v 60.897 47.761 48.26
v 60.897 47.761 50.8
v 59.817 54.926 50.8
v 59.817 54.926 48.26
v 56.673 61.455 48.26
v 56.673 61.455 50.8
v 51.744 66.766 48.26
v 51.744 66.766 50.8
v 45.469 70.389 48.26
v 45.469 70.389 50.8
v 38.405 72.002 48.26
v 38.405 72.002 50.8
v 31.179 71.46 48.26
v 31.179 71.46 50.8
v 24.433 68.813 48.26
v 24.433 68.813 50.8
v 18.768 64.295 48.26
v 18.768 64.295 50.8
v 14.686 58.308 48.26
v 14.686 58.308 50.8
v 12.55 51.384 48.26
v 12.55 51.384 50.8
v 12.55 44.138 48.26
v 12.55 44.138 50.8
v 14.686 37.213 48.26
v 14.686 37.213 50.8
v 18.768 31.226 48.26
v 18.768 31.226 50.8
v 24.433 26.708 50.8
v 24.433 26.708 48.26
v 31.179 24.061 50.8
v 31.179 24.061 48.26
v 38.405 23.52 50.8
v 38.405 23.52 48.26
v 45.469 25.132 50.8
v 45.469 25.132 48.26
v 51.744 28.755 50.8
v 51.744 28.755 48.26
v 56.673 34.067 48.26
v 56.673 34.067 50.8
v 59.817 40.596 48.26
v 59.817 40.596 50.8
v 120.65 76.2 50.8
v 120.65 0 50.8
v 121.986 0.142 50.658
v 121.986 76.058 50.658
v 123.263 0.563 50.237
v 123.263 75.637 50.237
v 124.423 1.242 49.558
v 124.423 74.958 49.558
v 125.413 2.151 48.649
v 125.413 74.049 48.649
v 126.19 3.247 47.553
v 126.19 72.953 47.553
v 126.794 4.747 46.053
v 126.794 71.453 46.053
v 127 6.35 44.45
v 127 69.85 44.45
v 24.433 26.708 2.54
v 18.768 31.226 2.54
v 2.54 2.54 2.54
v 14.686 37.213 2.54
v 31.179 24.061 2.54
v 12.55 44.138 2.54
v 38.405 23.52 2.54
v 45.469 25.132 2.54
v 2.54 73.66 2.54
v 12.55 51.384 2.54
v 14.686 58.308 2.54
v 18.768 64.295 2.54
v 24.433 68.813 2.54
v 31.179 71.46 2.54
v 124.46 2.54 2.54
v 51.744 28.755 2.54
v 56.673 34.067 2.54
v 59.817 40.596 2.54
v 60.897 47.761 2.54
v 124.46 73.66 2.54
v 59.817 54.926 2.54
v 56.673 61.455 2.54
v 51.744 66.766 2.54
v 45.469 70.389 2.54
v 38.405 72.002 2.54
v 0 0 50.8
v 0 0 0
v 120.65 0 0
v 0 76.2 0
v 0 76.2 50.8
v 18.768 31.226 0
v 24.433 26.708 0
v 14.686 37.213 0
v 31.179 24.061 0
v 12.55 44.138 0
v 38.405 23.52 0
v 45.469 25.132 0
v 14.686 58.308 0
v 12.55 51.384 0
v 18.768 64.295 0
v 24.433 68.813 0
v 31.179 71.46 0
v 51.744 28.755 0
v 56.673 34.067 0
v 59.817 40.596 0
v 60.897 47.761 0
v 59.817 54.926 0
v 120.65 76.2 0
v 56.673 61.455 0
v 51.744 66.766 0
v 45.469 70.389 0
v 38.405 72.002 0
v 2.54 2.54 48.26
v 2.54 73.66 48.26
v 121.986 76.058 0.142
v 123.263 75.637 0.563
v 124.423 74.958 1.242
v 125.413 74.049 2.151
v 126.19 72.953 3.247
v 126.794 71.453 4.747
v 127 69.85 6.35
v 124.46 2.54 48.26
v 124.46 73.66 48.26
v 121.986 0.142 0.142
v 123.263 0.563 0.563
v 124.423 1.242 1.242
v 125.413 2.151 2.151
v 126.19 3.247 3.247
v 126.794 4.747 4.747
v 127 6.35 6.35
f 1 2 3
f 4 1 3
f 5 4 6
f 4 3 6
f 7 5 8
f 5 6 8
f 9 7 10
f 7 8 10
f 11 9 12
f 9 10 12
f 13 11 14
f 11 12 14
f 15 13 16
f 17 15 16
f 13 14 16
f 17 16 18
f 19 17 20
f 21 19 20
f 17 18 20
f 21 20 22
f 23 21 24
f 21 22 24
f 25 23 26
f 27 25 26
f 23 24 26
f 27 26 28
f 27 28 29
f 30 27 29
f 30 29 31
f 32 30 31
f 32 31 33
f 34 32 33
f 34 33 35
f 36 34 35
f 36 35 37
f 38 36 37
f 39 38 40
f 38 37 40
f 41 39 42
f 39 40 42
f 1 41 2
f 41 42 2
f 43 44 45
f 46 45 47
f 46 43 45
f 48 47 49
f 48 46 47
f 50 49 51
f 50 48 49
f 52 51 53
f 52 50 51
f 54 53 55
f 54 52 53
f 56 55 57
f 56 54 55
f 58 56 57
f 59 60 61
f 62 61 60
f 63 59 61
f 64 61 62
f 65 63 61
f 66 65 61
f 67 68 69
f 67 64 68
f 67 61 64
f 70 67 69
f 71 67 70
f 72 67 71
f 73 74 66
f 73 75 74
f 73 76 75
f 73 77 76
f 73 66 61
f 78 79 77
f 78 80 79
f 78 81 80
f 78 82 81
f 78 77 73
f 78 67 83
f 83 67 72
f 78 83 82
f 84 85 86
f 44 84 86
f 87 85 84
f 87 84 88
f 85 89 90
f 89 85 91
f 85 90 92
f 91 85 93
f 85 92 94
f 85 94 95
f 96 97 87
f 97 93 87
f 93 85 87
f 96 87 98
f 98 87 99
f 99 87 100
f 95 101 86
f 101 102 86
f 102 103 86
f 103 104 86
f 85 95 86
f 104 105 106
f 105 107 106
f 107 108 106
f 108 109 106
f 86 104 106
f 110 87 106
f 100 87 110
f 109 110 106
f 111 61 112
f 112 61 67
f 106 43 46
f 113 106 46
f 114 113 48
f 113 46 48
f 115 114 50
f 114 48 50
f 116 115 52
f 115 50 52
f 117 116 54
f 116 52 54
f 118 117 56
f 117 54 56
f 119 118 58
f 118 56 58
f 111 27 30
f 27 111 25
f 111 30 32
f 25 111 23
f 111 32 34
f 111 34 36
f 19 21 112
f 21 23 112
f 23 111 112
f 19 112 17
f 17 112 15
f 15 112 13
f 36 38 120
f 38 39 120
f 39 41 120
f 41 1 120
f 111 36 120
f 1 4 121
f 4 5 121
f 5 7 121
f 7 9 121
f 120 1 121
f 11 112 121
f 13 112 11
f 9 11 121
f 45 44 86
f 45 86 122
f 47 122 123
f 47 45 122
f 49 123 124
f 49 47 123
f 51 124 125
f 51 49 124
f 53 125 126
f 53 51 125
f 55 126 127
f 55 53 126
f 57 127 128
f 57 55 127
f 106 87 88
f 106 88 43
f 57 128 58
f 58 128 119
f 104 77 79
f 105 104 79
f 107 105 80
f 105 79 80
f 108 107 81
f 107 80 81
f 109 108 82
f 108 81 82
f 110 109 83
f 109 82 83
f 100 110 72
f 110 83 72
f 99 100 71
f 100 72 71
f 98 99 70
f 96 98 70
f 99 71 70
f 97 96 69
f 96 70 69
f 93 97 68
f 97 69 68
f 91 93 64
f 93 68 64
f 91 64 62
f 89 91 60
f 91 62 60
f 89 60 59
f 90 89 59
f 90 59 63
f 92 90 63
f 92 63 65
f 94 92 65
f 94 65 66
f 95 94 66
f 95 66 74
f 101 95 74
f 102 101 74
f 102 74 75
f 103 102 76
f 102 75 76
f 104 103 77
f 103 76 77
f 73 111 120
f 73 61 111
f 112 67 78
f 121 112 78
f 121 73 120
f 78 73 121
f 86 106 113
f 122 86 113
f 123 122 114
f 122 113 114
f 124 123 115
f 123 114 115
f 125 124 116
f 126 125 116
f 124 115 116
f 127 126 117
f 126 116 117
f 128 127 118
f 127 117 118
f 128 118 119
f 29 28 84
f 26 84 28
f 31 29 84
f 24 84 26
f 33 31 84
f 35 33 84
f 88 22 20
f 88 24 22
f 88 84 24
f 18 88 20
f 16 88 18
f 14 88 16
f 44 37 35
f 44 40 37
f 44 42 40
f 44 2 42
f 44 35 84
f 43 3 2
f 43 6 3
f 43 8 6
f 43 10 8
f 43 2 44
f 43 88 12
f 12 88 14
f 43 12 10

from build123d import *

# Parameters (mm, degrees)
F0_W     = 127
F0_H     = 76.2
F1_DEPTH = 50.8
F2_R     = 24.309053
F3_DEPTH = 50.801
F4_T     = -2.54
F5_R     = 6.35


with BuildPart() as f1:
    # F0 (on Top) → F1 (new body)
    with BuildSketch(Plane.XY):
        with Locations((63.5, 38.1)):
            Rectangle(F0_W, F0_H)
    extrude(amount=F1_DEPTH)

    # F2 (on face) → F3 (cut, through all)
    with BuildSketch(Plane.XY.offset(50.8)):
        with Locations((36.587957, 47.760736)):
            Circle(F2_R)
    extrude(amount=-F3_DEPTH, mode=Mode.SUBTRACT)

    # F4
    f4_openings = [f1.faces().sort_by_distance(p)[0] for p in [
        (12.278904, 47.760736, 25.4),
    ]]
    offset(amount=F4_T, openings=f4_openings)

    # F5
    f5_edges = [f1.edges().sort_by_distance(p)[0] for p in [
        (127, 76.2, 25.4),
        (127, 38.1, 0),
        (127, 0, 25.4),
        (127, 38.1, 50.8),
    ]]
    fillet(f5_edges, radius=F5_R)


solid = f1.part
